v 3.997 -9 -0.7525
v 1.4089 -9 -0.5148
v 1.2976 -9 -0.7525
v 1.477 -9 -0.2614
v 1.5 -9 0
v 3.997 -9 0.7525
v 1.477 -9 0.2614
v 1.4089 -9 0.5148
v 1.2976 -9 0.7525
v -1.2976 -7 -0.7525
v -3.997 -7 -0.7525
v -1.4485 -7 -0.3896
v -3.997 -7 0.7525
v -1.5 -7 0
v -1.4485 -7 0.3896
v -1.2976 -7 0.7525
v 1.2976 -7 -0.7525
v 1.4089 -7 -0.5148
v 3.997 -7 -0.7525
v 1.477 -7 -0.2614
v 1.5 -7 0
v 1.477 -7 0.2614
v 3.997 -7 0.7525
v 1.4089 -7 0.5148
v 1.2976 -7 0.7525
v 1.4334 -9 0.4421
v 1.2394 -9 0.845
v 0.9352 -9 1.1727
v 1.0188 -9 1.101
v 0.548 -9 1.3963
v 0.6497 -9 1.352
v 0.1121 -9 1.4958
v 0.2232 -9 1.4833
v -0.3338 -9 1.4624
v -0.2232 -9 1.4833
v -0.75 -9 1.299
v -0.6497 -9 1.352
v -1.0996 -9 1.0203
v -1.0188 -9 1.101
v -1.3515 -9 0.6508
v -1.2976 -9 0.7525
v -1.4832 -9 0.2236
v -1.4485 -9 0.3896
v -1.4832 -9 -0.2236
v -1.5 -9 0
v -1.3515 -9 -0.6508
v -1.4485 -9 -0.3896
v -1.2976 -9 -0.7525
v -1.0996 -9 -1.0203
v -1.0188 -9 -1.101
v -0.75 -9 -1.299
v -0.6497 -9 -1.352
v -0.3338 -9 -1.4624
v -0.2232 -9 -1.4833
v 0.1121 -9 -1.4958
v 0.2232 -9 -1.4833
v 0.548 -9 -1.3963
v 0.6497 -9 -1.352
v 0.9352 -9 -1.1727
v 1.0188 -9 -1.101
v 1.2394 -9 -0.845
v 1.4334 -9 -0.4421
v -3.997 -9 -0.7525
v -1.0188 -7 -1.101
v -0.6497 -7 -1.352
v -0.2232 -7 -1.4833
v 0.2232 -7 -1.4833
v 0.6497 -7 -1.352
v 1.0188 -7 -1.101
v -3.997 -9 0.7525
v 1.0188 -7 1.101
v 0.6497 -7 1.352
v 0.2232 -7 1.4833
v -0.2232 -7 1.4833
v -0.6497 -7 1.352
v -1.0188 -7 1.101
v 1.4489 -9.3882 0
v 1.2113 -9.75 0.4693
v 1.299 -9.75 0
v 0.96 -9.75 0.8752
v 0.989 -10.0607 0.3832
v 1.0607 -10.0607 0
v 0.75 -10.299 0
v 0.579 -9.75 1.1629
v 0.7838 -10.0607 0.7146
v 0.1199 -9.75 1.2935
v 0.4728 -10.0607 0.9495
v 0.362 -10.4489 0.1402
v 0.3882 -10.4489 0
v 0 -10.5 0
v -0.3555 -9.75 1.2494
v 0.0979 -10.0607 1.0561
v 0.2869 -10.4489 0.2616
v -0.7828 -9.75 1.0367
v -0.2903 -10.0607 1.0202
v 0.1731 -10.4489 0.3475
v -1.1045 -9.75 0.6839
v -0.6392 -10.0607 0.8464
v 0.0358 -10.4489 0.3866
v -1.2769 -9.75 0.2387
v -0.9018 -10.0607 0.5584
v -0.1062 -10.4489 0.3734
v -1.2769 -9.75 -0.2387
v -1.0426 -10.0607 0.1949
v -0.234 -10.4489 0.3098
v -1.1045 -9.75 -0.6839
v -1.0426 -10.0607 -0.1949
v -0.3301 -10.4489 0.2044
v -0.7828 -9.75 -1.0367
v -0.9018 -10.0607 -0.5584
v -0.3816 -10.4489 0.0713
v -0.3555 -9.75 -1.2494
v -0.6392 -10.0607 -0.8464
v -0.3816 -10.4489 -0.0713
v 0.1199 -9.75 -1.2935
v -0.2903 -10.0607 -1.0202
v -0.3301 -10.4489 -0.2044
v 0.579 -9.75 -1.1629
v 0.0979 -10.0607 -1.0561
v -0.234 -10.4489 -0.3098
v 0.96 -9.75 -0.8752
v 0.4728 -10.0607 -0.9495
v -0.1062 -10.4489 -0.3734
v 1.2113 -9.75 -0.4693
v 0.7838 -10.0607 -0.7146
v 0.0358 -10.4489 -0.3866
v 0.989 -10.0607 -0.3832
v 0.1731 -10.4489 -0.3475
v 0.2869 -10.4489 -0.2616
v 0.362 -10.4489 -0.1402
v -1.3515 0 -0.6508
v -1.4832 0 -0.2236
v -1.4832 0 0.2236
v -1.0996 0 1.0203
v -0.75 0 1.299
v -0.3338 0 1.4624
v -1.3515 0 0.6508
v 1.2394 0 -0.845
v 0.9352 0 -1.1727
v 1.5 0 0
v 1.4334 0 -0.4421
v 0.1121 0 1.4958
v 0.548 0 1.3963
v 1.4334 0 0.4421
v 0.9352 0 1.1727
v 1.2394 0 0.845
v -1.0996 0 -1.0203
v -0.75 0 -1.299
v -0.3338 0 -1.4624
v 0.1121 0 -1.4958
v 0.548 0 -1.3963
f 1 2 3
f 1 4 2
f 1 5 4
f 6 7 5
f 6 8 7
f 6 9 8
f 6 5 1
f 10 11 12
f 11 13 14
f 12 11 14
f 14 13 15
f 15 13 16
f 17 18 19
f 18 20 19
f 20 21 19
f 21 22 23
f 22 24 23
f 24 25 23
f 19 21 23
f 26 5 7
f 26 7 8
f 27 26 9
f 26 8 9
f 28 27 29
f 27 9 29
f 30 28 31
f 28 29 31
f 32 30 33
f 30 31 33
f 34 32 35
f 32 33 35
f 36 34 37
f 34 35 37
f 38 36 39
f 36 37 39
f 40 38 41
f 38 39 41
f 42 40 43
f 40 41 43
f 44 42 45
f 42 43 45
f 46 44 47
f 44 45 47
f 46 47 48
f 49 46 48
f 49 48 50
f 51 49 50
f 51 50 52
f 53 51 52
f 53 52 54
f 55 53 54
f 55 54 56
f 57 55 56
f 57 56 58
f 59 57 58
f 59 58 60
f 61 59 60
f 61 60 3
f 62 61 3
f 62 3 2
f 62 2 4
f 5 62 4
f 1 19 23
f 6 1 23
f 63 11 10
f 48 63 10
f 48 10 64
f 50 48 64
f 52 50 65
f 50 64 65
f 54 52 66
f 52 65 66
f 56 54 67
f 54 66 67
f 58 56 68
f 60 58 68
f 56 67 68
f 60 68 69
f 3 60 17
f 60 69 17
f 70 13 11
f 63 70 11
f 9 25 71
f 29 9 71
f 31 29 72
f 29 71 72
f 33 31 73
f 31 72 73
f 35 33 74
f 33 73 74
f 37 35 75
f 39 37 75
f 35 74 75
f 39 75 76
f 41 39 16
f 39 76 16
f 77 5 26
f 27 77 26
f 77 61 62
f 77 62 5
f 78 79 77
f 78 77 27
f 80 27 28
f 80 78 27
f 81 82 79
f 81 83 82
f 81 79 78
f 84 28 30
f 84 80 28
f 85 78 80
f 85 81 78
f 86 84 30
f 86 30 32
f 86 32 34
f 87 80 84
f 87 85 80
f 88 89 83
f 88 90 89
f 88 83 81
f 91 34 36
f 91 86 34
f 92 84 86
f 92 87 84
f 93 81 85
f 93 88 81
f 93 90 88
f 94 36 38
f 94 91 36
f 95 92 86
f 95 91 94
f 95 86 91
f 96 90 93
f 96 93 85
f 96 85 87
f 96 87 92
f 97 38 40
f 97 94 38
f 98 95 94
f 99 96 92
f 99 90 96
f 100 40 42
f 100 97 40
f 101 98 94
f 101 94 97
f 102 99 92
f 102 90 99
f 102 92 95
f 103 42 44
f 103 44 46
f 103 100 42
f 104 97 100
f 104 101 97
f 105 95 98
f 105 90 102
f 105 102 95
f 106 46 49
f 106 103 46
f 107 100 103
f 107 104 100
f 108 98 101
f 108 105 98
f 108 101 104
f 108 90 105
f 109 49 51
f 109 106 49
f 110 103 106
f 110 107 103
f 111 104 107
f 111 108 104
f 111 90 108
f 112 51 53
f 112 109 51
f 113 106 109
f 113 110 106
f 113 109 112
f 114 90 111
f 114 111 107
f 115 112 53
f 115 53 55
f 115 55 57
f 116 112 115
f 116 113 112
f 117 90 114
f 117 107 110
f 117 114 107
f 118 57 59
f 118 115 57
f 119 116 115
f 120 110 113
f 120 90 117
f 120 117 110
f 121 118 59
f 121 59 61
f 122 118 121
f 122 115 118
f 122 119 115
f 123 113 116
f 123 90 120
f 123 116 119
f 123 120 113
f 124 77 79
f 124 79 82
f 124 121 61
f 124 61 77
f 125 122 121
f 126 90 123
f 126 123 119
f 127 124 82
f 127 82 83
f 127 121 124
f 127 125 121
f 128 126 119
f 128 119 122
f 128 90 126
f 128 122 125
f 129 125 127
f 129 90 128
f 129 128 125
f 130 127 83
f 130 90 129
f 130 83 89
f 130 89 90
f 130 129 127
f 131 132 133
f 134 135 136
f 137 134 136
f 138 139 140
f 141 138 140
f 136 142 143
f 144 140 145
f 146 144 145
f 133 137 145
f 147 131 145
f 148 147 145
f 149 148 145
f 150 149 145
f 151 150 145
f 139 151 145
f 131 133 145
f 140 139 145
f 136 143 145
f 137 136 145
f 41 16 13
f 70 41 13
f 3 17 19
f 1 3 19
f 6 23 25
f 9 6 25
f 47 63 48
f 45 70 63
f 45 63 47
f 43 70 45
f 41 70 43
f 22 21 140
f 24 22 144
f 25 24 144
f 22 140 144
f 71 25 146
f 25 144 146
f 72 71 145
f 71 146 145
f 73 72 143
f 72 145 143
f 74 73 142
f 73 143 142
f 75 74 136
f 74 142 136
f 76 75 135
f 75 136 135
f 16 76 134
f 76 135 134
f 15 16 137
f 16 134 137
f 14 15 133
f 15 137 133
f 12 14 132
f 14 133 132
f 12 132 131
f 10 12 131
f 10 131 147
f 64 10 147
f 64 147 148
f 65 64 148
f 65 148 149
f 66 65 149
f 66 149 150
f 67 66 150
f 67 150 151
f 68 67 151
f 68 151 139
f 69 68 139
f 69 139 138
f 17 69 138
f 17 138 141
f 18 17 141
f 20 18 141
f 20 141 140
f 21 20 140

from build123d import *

# Parameters (mm, degrees)
F0_R     = 1.5
F1_DEPTH = 7
F3_DEPTH = 2
F4_R     = 1.5
F5_DEPTH = 1.5
F6_R     = 1.49999


# Not quite as in the source:
# - a fillet or chamfer is up to 0.001 mm smaller than in the source, because OpenCascade refuses the exact size


with BuildPart() as f1:
    # F0 (on Front) → F1 (new body)
    with BuildSketch(Plane.XZ):
        Circle(F0_R)
    extrude(amount=F1_DEPTH)

    # F2 (on face) → F3 (join)
    with BuildSketch(Plane.XZ.offset(7)):
        with BuildLine():
            ThreePointArc((1.2976046011, -0.752477441), (1.4485176736, -0.3896107662), (1.5, 0))
            ThreePointArc((1.5, 0), (1.4485176736, 0.3896107662), (1.2976046011, 0.752477441))
            Line((1.2976046011, 0.752477441), (-1.2976046011, 0.752477441))
            ThreePointArc((-1.2976046011, 0.752477441), (-1.5, 0), (-1.2976046011, -0.752477441))
            Line((-1.2976046011, -0.752477441), (1.2976046011, -0.752477441))
        make_face()
        with BuildLine():
            ThreePointArc((1.2976046011, 0.752477441), (1.4485176736, 0.3896107662), (1.5, 0))
            ThreePointArc((1.5, 0), (1.4485176736, -0.3896107662), (1.2976046011, -0.752477441))
            Line((1.2976046011, -0.752477441), (3.9969966747, -0.752477441))
            Line((3.9969966747, -0.752477441), (3.9969966747, 0.752477441))
            Line((3.9969966747, 0.752477441), (1.2976046011, 0.752477441))
        make_face()
        with BuildLine():
            Line((-1.2976046011, 0.752477441), (1.2976046011, 0.752477441))
            ThreePointArc((1.2976046011, 0.752477441), (0, 1.5), (-1.2976046011, 0.752477441))
        make_face()
        with BuildLine():
            ThreePointArc((-1.2976046011, -0.752477441), (0, -1.5), (1.2976046011, -0.752477441))
            Line((1.2976046011, -0.752477441), (-1.2976046011, -0.752477441))
        make_face()
        with BuildLine():
            ThreePointArc((-1.2976046011, -0.752477441), (-1.5, 0), (-1.2976046011, 0.752477441))
            Line((-1.2976046011, 0.752477441), (-3.9969966747, 0.752477441))
            Line((-3.9969966747, 0.752477441), (-3.9969966747, -0.752477441))
            Line((-3.9969966747, -0.752477441), (-1.2976046011, -0.752477441))
        make_face()
    extrude(amount=F3_DEPTH)

    # F4 (on face) → F5 (join)
    with BuildSketch(Plane.XZ.offset(9)):
        Circle(F4_R)
    extrude(amount=F5_DEPTH)

    # F6 (radius 1.5 in the source; OpenCascade refuses exactly that, so slightly less here)
    f6_edges = [f1.edges().sort_by_distance(p)[0] for p in [
        (-1.5, -10.5, 0),
    ]]
    fillet(f6_edges, radius=F6_R)


solid = f1.part
